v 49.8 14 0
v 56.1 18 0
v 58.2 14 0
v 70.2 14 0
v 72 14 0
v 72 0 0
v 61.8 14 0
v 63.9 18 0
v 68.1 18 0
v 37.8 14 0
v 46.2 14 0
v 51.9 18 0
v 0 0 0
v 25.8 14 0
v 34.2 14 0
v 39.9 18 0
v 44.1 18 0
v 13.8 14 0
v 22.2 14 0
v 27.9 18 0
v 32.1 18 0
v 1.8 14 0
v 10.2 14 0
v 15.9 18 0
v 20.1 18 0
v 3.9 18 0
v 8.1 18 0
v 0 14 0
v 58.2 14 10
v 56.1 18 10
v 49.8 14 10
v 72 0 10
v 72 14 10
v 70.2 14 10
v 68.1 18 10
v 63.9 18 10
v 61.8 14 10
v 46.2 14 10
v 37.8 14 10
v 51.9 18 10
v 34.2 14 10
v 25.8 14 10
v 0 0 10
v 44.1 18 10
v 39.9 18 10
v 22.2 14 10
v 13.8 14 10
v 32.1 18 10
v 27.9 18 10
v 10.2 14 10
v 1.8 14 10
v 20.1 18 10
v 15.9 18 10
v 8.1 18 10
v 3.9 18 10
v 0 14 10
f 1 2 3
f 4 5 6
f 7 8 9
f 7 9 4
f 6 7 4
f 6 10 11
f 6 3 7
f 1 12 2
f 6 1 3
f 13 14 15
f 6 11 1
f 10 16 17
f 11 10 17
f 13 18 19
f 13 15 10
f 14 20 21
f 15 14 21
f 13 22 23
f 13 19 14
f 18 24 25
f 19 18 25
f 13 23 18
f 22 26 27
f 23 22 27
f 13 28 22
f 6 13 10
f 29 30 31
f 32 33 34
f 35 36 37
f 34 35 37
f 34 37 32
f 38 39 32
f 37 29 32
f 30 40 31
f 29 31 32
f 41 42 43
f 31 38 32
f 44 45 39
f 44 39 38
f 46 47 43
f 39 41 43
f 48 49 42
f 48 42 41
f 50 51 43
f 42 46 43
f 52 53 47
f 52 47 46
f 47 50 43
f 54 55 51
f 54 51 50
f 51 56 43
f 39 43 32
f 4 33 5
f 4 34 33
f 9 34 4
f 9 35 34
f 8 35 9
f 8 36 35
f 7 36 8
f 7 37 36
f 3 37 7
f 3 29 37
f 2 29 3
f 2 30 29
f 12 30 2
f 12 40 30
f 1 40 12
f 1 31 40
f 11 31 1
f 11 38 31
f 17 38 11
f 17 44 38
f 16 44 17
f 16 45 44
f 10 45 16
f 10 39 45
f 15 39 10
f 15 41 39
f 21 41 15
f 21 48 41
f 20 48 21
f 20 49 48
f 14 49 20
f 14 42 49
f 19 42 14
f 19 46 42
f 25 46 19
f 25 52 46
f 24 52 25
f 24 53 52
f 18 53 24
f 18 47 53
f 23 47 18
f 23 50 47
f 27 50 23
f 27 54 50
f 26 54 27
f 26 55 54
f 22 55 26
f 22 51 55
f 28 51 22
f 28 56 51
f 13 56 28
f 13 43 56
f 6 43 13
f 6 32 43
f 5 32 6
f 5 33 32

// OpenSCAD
$fn = 32;

// ----------------------------------------------------------------------
// Gear rack: 6 teeth, pitch 12 mm
// ----------------------------------------------------------------------

// --- parameters (mm) ---
teeth = 6;                // number of teeth
pitch = 12;               // tooth pitch, X
root_w = 8.4;             // tooth width at the root
tip_w = 4.2;              // tooth width at the tip
base_h = 14;              // rack body height, Y
tooth_h = 4;              // tooth height above the body
plate_t = 10;             // rack width, Z (extrusion height)

rack_l = teeth * pitch;  // overall length
total_h = base_h + tooth_h;  // overall height

profile = [[0, 0], [72, 0], [72, 14], [70.2, 14], [68.1, 18], [63.9, 18], [61.8, 14], [58.2, 14], [56.1, 18], [51.9, 18], [49.8, 14], [46.2, 14], [44.1, 18], [39.9, 18], [37.8, 14], [34.2, 14], [32.1, 18], [27.9, 18], [25.8, 14], [22.2, 14], [20.1, 18], [15.9, 18], [13.8, 14], [10.2, 14], [8.1, 18], [3.9, 18], [1.8, 14], [0, 14]];  // primary outline, 28 points, counter clockwise

// --- the one profile operation ---
linear_extrude(height = plate_t) polygon(points = profile);
